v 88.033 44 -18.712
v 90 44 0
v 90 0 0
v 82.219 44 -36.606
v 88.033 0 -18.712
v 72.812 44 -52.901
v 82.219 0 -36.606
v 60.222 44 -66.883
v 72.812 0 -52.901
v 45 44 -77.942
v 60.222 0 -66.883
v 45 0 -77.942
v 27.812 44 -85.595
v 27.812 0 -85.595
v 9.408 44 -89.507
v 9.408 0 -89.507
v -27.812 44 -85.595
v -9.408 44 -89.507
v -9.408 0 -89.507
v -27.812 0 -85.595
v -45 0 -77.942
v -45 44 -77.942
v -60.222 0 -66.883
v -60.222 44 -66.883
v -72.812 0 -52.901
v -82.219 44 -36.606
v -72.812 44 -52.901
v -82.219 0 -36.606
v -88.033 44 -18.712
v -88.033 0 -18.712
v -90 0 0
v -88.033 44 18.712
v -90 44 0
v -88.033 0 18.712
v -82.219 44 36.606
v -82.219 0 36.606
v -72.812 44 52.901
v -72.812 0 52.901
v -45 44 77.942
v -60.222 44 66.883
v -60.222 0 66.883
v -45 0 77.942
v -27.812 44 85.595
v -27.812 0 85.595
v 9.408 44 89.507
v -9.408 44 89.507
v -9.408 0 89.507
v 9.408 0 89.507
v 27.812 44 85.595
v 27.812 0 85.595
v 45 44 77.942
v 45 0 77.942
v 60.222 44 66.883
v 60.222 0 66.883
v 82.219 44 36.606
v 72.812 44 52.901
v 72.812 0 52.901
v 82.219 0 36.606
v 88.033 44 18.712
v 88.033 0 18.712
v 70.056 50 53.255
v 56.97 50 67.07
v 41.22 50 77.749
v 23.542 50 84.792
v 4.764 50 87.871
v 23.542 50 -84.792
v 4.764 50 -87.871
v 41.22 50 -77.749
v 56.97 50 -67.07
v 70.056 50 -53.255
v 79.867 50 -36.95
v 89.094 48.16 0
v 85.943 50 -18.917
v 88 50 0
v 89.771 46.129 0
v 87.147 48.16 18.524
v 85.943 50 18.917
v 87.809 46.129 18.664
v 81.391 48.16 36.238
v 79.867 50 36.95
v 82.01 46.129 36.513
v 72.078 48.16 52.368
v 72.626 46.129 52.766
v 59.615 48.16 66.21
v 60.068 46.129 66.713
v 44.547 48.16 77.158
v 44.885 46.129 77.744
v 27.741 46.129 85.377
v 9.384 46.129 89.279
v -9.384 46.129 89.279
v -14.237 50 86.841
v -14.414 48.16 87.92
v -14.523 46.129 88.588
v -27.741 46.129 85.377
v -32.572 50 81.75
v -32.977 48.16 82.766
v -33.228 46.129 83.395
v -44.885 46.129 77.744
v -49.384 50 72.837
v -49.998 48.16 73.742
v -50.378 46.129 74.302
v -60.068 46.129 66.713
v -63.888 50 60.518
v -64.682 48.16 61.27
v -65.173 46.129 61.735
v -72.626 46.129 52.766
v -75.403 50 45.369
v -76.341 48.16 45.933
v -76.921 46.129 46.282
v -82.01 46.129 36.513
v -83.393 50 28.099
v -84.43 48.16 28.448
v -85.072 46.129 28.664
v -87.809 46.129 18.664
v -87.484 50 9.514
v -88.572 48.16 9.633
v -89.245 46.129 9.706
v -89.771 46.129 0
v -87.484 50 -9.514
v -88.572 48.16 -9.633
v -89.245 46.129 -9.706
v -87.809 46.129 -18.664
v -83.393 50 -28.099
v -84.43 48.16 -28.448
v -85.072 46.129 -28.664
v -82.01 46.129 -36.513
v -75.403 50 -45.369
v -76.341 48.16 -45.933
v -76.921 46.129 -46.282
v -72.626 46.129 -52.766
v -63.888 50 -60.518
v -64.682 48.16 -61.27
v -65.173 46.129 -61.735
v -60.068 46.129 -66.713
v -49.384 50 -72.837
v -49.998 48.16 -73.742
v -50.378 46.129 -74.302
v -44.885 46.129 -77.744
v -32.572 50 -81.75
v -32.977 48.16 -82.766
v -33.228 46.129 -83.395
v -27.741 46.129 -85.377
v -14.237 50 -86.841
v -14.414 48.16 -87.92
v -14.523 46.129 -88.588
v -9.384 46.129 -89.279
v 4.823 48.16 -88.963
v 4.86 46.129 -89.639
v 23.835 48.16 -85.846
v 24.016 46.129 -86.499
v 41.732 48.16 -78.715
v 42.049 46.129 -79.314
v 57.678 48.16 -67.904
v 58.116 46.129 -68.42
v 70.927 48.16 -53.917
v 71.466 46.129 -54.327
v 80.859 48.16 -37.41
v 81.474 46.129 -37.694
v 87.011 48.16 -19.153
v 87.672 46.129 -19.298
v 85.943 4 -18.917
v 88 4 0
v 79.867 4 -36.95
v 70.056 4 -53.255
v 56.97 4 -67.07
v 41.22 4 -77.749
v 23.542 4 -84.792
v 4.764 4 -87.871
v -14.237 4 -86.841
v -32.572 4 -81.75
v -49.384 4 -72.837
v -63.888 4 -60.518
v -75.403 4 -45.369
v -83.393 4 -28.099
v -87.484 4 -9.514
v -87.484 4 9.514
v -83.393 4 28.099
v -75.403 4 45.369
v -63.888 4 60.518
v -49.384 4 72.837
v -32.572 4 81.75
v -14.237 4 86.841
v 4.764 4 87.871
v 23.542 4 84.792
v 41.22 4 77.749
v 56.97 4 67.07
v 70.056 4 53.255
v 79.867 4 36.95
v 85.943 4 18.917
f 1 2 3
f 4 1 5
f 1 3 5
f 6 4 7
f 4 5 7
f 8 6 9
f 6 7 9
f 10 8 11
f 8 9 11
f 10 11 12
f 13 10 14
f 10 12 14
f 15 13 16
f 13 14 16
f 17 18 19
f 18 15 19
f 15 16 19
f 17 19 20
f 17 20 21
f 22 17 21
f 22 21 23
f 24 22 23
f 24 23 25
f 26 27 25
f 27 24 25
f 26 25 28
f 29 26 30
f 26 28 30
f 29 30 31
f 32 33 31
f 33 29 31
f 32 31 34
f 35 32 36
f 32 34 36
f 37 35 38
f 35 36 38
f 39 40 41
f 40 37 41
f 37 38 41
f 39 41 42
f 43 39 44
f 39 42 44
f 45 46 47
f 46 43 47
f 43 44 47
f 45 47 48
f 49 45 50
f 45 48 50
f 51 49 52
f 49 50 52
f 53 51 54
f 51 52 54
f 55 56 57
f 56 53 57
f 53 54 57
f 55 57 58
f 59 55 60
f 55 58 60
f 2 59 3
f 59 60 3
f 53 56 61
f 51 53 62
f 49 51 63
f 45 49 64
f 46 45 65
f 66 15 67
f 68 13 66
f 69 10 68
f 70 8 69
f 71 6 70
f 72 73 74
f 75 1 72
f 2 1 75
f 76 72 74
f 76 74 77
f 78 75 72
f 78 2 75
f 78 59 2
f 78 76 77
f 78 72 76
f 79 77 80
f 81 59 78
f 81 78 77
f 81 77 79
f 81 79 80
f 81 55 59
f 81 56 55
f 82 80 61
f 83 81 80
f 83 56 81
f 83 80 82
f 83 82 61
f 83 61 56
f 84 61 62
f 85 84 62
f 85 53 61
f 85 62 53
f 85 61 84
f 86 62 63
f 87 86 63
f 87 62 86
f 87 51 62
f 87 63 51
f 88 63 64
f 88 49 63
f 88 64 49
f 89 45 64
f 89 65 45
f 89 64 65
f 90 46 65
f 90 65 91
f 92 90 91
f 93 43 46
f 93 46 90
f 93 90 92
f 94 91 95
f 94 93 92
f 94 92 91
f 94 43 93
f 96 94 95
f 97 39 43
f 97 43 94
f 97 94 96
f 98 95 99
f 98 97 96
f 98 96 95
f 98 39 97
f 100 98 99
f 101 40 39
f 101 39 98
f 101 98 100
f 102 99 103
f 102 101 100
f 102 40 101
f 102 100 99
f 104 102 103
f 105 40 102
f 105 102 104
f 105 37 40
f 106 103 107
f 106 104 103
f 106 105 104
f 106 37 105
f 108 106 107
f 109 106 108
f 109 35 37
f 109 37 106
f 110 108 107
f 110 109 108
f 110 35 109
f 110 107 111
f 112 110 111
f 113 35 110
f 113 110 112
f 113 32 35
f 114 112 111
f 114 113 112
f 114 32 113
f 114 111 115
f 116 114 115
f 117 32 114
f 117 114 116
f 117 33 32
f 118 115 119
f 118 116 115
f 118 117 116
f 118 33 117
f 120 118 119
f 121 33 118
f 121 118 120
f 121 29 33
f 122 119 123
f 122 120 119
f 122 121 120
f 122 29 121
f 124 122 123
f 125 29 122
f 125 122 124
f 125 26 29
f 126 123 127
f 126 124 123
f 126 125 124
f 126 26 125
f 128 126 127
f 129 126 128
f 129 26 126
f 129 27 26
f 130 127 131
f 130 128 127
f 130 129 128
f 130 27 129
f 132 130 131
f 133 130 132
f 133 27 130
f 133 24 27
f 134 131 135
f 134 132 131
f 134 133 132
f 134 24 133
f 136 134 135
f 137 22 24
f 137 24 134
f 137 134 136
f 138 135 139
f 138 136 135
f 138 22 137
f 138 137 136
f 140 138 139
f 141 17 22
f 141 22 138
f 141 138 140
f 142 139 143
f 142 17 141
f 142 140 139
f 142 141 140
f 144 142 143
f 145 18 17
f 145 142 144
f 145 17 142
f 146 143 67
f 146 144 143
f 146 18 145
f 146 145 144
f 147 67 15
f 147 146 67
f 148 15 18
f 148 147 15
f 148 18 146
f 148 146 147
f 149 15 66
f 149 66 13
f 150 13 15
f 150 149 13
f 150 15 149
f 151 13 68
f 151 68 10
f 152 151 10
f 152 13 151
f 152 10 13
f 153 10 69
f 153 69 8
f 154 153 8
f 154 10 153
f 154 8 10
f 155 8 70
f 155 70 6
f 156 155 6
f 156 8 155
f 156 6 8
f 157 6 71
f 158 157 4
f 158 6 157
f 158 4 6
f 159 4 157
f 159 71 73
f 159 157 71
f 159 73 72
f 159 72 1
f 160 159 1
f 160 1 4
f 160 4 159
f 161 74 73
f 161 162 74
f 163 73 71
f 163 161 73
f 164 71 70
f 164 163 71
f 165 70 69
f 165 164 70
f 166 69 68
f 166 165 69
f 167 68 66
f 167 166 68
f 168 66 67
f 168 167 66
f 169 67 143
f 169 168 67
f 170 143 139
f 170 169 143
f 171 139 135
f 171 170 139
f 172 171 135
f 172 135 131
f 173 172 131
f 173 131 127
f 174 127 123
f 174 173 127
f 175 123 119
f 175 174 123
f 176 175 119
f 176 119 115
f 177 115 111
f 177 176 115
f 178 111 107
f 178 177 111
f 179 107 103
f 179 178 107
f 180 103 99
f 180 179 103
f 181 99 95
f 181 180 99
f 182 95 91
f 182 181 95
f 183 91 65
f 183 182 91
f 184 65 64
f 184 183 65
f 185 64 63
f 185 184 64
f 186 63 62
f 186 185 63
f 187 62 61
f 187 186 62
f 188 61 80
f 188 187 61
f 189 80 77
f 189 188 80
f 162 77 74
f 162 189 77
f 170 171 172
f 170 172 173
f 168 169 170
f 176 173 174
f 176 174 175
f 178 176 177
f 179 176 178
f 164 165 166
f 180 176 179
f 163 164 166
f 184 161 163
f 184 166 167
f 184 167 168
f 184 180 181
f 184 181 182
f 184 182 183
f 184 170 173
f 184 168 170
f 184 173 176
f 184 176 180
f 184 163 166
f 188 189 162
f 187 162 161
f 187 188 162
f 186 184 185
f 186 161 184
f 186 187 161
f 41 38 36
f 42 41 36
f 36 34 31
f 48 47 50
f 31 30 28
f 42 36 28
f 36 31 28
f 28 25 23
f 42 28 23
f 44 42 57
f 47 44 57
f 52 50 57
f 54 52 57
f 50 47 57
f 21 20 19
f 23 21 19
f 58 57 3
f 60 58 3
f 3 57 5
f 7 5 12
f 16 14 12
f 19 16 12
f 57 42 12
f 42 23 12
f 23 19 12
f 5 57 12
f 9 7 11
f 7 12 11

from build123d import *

# Parameters (mm, degrees)
SKETCH2_R           = 90
SKETCH1_R           = 90
SHELL1_T            = -2
CUT_EXTRUDE1_START  = -50
SKETCH4_R           = 90
CUT_EXTRUDE1_DEPTH  = 50
FILLET1_R           = 10
SKETCH5_R           = 88
BOSS_EXTRUDE1_DEPTH = 2


with BuildPart() as part:
    # Sketch2 → Loft1 section 0
    with BuildSketch(Plane(origin=(0, 100, 0), x_dir=(1, 0, 0), z_dir=(0, 1, 0))):
        Circle(SKETCH2_R)
    # Sketch1 → Loft1 section 1
    with BuildSketch(Plane(origin=(0, 0, 0), x_dir=(1, 0, 0), z_dir=(0, 1, 0))):
        Circle(SKETCH1_R)
    loft()

    # Shell1
    shell1_openings = [part.faces().sort_by_distance(p)[0] for p in [
        (0, 100, 0),
    ]]
    offset(amount=SHELL1_T, openings=shell1_openings, kind=Kind.INTERSECTION)

    # Sketch4 → Cut-Extrude1 (cut)
    with BuildSketch(Plane(origin=(0, 100, 0), x_dir=(1, 0, 0), z_dir=(0, 1, 0)).offset(CUT_EXTRUDE1_START)):
        with Locations(Location((0, 0, 0), (0, 0, 270))):
            Circle(SKETCH4_R)
    extrude(amount=CUT_EXTRUDE1_DEPTH, mode=Mode.SUBTRACT)

    # Fillet1
    # the kernel refuses this fillet: 10 mm, written as the material it takes off along each edge
    with BuildSketch(Plane(origin=(0, 50, 0), x_dir=(1, 0, 0), z_dir=(0, 0, -1))) as fillet1_piece_1:
        with BuildLine():
            CenterArc((80, 6), FILLET1_R, 323.130102354, 36.869897646)
            Line((88, 0), (88.16, -0.12))
            ThreePointArc((88.16, -0.12), (89, -0.2), (90, -0.2))
            Line((90, -0.2), (90.2, 0))
            Line((90.2, 0), (90.2, 6))
            Line((90.2, 6), (90, 6))
        make_face()
    revolve(axis=Axis((0, 50, 0), (0, -1, 0)), mode=Mode.SUBTRACT)

    # Sketch5 → Boss-Extrude1 (add)
    with BuildSketch(Plane(origin=(0, 2, 0), x_dir=(1, 0, 0), z_dir=(0, 1, 0))):
        with Locations(Location((0, 0, 0), (0, 0, 270))):
            Circle(SKETCH5_R)
    extrude(amount=BOSS_EXTRUDE1_DEPTH)


solid = part.part
